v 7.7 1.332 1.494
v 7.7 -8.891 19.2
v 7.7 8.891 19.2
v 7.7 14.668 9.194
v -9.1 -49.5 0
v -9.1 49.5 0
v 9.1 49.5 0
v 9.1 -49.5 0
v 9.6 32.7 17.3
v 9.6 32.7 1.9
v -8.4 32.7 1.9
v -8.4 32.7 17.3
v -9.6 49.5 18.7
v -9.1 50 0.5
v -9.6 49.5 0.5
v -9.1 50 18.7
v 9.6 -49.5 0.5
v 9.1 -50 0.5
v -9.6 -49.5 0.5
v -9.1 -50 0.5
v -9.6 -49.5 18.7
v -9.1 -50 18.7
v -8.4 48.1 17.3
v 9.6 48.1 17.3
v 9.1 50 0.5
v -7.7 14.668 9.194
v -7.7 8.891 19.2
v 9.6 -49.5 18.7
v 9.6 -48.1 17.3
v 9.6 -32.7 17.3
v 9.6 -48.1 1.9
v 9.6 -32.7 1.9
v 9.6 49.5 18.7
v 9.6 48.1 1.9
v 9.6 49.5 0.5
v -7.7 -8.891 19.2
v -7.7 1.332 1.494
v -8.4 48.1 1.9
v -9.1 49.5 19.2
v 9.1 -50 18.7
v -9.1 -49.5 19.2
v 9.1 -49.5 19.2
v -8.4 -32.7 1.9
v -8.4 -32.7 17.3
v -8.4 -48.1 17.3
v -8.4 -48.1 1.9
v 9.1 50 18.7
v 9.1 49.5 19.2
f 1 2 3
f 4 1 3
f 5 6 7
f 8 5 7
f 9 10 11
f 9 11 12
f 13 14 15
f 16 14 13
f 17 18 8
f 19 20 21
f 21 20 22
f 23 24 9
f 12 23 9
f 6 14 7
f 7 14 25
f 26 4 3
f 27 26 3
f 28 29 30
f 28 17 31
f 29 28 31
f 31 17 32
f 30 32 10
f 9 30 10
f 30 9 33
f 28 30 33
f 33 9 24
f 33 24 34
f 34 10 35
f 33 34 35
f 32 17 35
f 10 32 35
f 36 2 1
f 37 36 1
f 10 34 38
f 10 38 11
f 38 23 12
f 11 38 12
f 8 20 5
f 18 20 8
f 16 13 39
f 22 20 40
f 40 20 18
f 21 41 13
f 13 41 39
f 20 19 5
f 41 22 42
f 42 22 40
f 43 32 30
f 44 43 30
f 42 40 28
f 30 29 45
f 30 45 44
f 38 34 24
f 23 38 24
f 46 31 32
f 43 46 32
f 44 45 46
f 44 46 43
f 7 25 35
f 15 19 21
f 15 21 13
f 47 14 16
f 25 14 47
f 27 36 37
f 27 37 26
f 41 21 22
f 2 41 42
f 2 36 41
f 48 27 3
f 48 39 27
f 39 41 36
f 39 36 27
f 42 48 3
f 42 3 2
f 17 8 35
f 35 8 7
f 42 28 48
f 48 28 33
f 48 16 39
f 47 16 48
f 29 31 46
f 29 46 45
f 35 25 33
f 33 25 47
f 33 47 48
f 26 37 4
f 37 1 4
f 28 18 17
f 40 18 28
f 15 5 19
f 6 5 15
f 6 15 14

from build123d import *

# Parameters (mm, degrees)
F0_W          = 19.2
F0_H          = 100
F1_DEPTH      = 19.2
F2_W          = 15.4
F2_H          = 15.4
F3_DEPTH      = 18
F5_DEPTH      = 7.7
F5_DEPTH_BACK = 7.7
F6_SIZE       = 0.5


# Not quite as in the source:
# - a pattern or mirror of a feature is missing from the dataset's text; its kind, count and spacing are read off the source's solid


with BuildPart() as f1:
    # F0 (on Top) → F1 (new body)
    with BuildSketch(Plane.XY):
        Rectangle(F0_W, F0_H)
    extrude(amount=F1_DEPTH)

    # F2 (on face) → F3 (cut)
    with BuildSketch(Plane.YZ.offset(9.6)):
        with Locations((-40.4, 9.6)):
            Rectangle(F2_W, F2_H)
    f3 = extrude(amount=-F3_DEPTH, mode=Mode.SUBTRACT)

    # F3_copies: F3 across plane
    add(f3.mirror(Plane.ZX), mode=Mode.SUBTRACT)

    # F4 (on Right) → F5 (cut, two sides)
    with BuildSketch(Plane.YZ) as f5_sk:
        Polygon((1.3316043909, 1.4935935394), (8, 5.3435935394), (14.6683956091, 9.1935935394), (-10.4682390124, 52.7315218353), (-23.8050302307, 45.0315218353), align=None)
    extrude(amount=-F5_DEPTH, mode=Mode.SUBTRACT)
    extrude(f5_sk.sketch, amount=F5_DEPTH_BACK, mode=Mode.SUBTRACT)

    # F6
    f6_edges = [f1.edges().sort_by_distance(p)[0] for p in [
        (-9.6, 50, 9.6),
        (-9.6, -50, 9.6),
        (-9.6, 0, 0),
        (-9.6, 0, 19.2),
        (9.6, -50, 9.6),
        (0, -50, 0),
        (0, -50, 19.2),
        (9.6, 50, 9.6),
        (0, 50, 0),
        (0, 50, 19.2),
        (9.6, 0, 0),
        (9.6, 0, 19.2),
    ]]
    chamfer(f6_edges, length=F6_SIZE)


solid = f1.part
